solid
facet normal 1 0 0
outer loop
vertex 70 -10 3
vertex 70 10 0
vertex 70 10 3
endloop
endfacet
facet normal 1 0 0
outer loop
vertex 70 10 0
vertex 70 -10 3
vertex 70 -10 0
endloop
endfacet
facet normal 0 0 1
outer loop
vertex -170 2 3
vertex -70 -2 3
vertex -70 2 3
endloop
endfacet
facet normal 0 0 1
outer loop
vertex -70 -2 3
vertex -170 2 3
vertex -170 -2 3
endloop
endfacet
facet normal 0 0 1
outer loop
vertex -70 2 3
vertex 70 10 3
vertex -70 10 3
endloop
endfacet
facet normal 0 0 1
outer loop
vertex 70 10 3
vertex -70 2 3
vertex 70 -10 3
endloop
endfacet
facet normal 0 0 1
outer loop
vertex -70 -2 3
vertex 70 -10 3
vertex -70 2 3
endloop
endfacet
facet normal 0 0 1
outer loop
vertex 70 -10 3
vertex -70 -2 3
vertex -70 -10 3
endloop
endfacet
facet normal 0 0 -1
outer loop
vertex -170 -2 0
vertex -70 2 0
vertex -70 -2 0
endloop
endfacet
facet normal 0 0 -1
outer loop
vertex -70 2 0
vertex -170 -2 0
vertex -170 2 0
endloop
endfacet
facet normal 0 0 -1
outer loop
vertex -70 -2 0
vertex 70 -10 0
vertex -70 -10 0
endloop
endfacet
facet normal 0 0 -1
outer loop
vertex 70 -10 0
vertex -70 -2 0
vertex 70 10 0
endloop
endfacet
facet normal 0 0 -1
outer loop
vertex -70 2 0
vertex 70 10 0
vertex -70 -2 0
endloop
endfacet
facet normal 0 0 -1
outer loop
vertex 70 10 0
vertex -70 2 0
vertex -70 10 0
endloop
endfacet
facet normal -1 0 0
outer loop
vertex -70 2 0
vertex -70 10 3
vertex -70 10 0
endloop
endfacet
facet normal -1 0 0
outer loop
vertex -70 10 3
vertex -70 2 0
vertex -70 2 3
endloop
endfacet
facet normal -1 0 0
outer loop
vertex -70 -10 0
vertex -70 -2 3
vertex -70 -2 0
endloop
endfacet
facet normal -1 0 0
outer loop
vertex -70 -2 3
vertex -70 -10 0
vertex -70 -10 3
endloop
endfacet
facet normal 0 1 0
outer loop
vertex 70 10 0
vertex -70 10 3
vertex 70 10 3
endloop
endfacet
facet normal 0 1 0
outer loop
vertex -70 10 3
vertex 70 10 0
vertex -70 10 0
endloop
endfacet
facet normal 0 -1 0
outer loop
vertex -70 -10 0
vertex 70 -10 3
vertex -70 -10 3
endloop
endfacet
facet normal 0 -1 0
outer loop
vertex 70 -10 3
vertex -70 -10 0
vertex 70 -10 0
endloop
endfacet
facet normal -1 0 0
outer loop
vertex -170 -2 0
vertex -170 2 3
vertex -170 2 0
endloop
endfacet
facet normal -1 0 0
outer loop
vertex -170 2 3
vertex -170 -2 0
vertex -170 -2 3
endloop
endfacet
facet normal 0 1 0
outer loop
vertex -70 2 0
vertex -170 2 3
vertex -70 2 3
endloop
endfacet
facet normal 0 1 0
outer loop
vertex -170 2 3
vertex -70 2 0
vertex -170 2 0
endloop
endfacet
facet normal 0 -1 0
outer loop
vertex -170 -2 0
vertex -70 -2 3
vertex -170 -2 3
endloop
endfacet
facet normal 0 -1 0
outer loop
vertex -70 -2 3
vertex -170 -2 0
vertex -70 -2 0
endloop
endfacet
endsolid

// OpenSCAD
letter="Big Rainbow";
    
length = 140;    

translate([-length/2, -10, 0])
    color("white", 1.0) 
        cube([length, 20, 3], center=false) ;

color("blue", 1.0)
    translate([-length/2 - 100, -2, 0])
        cube([100, 4, 3]);
